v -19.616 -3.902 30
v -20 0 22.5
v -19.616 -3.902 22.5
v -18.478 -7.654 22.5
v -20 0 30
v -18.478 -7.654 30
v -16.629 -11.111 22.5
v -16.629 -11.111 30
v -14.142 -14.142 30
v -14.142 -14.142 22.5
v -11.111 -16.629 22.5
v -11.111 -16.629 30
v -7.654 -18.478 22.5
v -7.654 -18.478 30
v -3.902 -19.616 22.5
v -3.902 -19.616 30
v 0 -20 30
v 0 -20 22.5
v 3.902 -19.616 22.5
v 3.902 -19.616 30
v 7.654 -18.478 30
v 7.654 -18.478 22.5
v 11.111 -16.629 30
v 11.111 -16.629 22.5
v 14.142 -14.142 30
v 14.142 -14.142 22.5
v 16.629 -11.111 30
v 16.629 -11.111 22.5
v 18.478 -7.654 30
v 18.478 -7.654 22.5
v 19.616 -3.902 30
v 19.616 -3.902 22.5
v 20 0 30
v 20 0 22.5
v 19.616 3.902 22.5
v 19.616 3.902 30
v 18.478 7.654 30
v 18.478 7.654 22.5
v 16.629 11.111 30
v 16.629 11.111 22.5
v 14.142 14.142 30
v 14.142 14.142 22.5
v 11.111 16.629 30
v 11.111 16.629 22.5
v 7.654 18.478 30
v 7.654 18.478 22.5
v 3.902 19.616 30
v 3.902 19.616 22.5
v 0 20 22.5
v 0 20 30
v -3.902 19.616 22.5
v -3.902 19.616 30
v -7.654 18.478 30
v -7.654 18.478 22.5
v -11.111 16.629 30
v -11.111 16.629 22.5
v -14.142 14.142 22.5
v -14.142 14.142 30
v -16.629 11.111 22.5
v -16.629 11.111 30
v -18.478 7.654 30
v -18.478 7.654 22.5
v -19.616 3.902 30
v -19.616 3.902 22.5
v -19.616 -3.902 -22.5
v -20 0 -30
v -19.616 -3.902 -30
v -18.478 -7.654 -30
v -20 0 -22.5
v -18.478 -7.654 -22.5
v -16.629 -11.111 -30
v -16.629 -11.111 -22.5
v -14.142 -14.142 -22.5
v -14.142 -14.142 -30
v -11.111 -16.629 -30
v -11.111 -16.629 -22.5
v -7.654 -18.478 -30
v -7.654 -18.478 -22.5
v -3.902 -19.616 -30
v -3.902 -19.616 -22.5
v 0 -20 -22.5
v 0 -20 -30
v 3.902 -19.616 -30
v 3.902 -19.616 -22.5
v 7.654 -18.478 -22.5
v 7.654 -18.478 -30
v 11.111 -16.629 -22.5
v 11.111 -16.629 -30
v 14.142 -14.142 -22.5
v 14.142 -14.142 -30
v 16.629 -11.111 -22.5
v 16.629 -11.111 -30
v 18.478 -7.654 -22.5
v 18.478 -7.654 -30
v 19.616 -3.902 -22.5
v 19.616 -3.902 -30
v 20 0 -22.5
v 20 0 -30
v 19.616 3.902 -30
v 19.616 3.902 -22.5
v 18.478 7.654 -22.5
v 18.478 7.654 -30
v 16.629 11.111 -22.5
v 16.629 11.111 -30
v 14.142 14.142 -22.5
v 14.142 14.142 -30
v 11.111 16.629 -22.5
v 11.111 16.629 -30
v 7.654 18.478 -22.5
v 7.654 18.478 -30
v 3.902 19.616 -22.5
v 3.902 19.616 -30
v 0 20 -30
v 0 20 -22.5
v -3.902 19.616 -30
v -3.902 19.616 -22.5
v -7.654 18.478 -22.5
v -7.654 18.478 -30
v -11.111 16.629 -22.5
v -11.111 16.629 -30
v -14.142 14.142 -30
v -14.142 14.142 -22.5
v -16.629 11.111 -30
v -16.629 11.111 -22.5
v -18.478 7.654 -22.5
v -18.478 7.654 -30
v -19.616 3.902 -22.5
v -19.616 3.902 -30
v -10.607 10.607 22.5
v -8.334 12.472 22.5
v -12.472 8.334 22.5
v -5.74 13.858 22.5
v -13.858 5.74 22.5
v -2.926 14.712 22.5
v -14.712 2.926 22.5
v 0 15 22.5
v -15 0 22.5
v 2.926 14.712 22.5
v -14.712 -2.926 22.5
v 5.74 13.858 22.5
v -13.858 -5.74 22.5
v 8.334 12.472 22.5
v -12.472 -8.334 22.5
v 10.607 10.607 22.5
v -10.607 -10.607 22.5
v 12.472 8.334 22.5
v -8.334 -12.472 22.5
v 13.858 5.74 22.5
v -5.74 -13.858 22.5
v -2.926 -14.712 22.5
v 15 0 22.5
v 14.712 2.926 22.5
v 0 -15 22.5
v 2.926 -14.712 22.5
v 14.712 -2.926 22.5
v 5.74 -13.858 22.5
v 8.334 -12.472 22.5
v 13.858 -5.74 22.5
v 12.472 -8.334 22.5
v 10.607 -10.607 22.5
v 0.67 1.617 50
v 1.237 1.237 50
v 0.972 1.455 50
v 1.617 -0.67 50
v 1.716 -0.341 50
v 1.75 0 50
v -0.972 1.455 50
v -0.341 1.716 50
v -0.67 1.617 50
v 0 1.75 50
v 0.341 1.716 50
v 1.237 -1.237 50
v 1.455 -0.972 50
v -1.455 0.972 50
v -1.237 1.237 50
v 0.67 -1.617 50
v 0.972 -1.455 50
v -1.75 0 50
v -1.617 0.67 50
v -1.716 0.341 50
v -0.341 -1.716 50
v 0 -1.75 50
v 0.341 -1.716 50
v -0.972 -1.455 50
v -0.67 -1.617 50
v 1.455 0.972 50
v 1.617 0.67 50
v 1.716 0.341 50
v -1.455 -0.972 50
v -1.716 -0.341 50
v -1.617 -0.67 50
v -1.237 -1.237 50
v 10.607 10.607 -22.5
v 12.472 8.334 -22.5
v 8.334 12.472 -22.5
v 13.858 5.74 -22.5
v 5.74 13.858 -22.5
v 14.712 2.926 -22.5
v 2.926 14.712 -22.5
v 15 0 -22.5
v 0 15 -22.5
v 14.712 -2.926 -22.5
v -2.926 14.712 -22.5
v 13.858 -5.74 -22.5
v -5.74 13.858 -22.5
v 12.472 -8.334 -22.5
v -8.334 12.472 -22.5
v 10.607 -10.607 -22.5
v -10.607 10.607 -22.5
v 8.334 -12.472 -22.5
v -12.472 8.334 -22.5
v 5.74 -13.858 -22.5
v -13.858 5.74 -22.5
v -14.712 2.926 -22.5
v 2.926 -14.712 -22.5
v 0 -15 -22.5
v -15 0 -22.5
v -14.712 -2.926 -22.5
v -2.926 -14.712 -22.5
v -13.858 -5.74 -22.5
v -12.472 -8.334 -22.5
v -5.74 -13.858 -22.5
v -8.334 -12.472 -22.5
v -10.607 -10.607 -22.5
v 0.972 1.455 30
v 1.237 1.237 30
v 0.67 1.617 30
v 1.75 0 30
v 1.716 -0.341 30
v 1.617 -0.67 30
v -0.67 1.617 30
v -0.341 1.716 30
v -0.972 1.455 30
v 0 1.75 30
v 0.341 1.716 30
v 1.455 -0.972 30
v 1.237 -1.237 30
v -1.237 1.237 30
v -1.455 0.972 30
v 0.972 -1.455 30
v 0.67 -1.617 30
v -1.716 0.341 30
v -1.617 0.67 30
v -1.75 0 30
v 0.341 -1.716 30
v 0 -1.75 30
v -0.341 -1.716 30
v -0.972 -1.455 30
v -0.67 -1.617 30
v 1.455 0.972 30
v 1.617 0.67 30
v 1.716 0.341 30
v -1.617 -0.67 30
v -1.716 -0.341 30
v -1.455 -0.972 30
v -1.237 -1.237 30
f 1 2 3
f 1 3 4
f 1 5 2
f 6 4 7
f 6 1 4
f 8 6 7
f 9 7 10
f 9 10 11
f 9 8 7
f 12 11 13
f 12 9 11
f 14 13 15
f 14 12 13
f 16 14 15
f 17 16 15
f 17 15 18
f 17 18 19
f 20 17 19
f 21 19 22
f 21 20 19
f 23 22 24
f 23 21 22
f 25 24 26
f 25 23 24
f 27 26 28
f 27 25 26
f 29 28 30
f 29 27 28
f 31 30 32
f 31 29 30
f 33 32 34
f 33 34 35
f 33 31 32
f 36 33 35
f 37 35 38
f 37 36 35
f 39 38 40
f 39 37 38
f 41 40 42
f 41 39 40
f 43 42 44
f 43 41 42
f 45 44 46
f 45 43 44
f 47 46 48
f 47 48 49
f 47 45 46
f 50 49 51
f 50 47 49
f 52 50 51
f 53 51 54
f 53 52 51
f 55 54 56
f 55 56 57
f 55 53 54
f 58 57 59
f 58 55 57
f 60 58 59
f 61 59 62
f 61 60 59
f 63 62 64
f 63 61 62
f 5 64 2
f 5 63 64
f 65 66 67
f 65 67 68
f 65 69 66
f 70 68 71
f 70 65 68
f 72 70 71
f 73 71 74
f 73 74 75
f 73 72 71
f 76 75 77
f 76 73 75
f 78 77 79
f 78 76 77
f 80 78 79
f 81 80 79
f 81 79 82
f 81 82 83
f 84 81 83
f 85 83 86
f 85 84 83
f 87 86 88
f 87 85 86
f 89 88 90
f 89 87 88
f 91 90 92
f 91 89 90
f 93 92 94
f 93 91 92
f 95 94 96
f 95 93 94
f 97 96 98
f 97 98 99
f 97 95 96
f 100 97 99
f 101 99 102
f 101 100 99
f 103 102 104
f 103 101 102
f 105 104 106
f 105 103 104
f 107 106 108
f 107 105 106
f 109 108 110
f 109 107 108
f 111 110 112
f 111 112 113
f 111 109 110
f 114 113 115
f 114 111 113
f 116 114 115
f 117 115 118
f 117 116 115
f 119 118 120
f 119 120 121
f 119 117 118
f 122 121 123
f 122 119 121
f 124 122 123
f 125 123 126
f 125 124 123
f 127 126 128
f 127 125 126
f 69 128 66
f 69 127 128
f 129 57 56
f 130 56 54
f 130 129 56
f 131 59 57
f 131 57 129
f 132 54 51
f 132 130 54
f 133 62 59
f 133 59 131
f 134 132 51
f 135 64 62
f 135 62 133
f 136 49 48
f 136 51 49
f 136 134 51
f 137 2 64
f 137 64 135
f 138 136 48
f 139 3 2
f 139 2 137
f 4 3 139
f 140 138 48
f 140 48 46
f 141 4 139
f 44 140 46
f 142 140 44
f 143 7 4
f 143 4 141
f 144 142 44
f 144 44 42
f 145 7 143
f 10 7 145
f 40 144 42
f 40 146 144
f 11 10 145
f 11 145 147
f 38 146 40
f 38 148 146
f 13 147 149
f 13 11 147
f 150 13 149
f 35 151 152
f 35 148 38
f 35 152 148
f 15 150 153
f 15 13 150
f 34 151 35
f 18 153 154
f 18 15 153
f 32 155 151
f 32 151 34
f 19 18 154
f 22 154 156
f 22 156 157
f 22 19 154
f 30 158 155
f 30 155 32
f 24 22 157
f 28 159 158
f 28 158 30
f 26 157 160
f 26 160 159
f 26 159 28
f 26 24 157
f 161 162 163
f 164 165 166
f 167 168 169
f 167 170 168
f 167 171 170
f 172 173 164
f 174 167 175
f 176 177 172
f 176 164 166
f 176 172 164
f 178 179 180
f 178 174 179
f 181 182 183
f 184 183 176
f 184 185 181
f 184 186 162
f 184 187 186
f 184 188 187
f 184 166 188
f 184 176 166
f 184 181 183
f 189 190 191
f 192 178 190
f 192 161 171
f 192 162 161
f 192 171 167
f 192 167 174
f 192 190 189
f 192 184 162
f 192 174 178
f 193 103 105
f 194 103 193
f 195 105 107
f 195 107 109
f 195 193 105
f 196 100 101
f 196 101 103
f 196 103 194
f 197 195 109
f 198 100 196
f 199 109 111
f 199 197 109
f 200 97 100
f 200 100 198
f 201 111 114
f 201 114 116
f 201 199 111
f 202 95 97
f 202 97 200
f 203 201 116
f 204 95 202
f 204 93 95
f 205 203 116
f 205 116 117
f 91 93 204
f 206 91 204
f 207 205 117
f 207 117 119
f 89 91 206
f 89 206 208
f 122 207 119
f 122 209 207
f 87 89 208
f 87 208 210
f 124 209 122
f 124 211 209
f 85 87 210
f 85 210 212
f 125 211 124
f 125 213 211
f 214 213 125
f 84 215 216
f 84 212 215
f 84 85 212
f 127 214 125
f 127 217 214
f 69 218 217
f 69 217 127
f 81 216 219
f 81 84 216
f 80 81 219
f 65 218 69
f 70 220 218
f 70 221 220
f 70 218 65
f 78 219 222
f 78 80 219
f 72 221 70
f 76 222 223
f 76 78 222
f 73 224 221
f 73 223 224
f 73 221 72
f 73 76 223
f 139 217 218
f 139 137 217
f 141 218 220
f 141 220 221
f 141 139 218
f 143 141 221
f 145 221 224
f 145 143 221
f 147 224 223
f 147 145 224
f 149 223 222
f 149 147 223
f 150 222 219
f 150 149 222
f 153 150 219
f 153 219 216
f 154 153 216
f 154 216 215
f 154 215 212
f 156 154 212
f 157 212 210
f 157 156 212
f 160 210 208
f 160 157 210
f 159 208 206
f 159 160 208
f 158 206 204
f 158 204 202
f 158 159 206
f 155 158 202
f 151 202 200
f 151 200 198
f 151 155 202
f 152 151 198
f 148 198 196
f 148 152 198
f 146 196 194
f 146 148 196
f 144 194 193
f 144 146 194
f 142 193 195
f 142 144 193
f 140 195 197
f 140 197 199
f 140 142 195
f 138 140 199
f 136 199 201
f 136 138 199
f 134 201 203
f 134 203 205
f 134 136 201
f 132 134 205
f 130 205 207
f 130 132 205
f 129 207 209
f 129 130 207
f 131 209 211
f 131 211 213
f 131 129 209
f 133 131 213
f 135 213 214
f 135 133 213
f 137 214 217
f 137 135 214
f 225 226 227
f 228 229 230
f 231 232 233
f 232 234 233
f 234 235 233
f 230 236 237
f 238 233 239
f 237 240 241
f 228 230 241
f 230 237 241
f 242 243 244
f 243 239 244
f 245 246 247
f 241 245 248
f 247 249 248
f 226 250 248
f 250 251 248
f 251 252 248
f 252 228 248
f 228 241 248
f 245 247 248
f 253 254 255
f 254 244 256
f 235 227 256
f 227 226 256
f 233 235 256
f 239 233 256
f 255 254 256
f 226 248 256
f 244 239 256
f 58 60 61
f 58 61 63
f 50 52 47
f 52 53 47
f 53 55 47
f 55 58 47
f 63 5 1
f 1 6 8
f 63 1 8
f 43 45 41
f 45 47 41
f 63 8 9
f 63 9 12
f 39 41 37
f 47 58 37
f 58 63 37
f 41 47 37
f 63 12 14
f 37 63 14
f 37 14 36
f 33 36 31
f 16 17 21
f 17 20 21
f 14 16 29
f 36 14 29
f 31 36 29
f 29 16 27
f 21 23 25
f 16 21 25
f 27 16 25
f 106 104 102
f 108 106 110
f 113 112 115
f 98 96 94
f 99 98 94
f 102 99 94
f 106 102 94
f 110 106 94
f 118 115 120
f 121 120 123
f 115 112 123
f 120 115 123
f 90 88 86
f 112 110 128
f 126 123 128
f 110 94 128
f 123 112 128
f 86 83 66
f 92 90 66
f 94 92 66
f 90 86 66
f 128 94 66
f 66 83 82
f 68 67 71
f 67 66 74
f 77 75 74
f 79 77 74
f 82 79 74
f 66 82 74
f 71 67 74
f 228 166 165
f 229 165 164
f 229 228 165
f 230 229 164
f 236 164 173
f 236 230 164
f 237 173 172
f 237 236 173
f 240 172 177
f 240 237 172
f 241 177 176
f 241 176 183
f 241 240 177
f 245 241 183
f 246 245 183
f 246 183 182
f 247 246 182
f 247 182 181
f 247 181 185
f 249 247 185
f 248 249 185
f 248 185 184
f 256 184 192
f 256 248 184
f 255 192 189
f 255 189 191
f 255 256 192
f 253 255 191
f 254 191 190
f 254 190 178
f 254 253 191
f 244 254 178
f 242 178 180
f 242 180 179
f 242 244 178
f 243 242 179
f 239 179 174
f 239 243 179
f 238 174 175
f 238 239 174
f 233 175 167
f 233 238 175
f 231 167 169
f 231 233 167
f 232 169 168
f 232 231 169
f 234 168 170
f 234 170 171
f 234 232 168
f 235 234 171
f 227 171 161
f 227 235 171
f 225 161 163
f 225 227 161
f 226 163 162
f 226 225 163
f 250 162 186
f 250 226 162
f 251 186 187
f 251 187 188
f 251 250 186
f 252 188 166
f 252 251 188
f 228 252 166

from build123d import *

# Parameters (mm, degrees)
SKETCH2_W = 1.75
SKETCH2_H = 20


with BuildPart() as part:
    # Sketch1 → Revolve1 (revolve)
    with BuildSketch(Plane(origin=(0, 0, 0), x_dir=(1, 0, 0), z_dir=(0, 1, 0)), mode=Mode.PRIVATE) as revolve1_sk:
        Polygon((15, 30), (20, 30), (20, 22.5), (15, 22.5), (15, -22.5), (20, -22.5), (20, -30), (15, -30), (0, -30), (0, 30), align=None)
    revolve(revolve1_sk.sketch.rotate(Axis((0, 0, -30), (0, 0, 1)), 180), axis=Axis((0, 0, -30), (0, 0, 1)))


with BuildPart() as body_2:
    # Sketch2 → Revolve2 (revolve)
    with BuildSketch(Plane(origin=(0, 0, 0), x_dir=(1, 0, 0), z_dir=(0, 1, 0))):
        with Locations((0.875, -40)):
            Rectangle(SKETCH2_W, SKETCH2_H)
    revolve(axis=Axis((0, 0, 8.040665434), (0, 0, -1)))


solid = Compound([part.part, body_2.part])
